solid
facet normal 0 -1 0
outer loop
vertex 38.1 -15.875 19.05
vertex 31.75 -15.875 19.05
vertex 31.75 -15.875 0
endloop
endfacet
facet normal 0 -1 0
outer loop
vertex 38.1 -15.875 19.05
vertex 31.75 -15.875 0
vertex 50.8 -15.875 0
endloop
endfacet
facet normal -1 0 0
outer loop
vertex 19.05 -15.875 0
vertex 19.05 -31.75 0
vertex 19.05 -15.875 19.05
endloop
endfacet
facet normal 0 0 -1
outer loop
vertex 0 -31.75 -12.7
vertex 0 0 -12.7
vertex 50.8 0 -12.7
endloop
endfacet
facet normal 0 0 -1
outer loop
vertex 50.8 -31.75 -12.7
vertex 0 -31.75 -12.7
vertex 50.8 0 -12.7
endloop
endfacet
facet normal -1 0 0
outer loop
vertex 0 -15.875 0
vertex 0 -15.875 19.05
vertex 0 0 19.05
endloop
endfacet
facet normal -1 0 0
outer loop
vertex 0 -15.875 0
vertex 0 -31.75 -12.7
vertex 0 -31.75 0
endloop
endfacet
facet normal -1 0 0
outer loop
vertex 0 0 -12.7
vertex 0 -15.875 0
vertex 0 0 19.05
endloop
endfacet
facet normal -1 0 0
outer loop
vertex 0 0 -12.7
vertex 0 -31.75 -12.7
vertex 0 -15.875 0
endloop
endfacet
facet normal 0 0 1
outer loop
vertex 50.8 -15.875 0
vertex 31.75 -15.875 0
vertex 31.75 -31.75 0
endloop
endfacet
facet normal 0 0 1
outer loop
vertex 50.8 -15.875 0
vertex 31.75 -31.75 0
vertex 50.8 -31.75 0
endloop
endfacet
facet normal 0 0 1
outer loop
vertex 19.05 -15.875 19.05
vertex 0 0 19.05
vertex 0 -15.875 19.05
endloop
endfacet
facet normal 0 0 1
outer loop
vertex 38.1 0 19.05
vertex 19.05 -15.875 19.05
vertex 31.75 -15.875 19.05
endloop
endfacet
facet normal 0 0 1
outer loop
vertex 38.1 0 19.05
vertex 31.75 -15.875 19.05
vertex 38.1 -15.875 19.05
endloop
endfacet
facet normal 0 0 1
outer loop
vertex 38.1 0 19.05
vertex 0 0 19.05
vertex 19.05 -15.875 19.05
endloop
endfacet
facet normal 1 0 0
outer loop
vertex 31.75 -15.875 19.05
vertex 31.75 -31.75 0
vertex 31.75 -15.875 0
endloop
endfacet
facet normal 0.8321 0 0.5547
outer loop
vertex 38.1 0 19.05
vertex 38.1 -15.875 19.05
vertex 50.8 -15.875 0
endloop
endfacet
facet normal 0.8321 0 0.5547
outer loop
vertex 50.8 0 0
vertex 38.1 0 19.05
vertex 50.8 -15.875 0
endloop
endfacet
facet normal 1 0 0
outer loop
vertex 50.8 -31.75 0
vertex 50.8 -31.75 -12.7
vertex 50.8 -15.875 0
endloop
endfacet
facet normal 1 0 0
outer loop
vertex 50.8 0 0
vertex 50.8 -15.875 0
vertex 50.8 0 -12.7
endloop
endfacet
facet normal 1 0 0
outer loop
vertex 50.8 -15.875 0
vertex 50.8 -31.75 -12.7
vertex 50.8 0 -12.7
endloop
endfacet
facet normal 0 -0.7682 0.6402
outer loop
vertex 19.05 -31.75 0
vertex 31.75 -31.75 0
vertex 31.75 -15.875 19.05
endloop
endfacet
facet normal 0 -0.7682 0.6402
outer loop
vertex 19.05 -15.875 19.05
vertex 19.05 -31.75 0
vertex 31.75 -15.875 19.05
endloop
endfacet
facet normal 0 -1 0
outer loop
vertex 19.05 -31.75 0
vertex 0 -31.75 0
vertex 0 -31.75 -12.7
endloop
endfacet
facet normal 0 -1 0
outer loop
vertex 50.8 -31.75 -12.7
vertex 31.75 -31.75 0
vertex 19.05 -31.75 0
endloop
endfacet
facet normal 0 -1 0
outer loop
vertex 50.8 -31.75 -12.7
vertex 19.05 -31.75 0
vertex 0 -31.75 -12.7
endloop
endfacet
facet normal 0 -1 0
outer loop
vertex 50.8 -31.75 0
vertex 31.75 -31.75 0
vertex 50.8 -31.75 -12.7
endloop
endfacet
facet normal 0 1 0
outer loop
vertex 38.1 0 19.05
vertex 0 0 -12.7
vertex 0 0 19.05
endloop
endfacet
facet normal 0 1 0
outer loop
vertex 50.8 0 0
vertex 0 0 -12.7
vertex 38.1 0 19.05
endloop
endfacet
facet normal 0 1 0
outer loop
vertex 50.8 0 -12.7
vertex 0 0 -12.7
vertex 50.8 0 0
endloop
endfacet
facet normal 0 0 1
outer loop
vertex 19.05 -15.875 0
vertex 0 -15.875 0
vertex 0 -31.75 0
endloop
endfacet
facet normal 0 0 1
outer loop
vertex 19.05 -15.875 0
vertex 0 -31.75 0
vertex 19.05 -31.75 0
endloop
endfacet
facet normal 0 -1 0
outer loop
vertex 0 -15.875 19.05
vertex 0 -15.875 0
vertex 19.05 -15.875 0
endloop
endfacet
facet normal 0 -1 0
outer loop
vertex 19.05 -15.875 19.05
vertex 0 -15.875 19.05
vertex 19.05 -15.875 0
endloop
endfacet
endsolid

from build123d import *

# Parameters (mm, degrees)
F0_W     = 50.8
F0_H     = 12.7
F1_DEPTH = 31.75
F2_W     = 50.8
F2_H     = 15.875
F3_DEPTH = 19.05
F5_DEPTH = 25.4
F6_W     = 12.7
F6_H     = 15.875
F7_DEPTH = 19.05
F9_DEPTH = 31.751


with BuildPart() as f1:
    # F0 (on Front) → F1 (new body)
    with BuildSketch(Plane.XZ):
        with Locations((25.4, -6.35)):
            Rectangle(F0_W, F0_H)
    extrude(amount=F1_DEPTH)

    # F2 (on face) → F3 (join)
    with BuildSketch(Plane.XY):
        with Locations((25.4, -7.9375)):
            Rectangle(F2_W, F2_H)
    extrude(amount=F3_DEPTH)

    # F4 (on face) → F5 (cut)
    with BuildSketch(Plane.XZ.offset(15.875)):
        Polygon((50.8, 0), (50.8, 19.05), (38.1, 19.05), align=None)
    extrude(amount=-F5_DEPTH, mode=Mode.SUBTRACT)

    # F6 (on face) → F7 (join)
    with BuildSketch(Plane.XY):
        with Locations((25.4, -23.8125)):
            Rectangle(F6_W, F6_H)
    extrude(amount=F7_DEPTH)

    # F8 (on face) → F9 (cut, through all)
    with BuildSketch(Plane.YZ.offset(31.75)):
        Polygon((-31.75, 0), (-15.875, 19.05), (-31.75, 19.05), align=None)
    extrude(amount=-F9_DEPTH, mode=Mode.SUBTRACT)


solid = f1.part
